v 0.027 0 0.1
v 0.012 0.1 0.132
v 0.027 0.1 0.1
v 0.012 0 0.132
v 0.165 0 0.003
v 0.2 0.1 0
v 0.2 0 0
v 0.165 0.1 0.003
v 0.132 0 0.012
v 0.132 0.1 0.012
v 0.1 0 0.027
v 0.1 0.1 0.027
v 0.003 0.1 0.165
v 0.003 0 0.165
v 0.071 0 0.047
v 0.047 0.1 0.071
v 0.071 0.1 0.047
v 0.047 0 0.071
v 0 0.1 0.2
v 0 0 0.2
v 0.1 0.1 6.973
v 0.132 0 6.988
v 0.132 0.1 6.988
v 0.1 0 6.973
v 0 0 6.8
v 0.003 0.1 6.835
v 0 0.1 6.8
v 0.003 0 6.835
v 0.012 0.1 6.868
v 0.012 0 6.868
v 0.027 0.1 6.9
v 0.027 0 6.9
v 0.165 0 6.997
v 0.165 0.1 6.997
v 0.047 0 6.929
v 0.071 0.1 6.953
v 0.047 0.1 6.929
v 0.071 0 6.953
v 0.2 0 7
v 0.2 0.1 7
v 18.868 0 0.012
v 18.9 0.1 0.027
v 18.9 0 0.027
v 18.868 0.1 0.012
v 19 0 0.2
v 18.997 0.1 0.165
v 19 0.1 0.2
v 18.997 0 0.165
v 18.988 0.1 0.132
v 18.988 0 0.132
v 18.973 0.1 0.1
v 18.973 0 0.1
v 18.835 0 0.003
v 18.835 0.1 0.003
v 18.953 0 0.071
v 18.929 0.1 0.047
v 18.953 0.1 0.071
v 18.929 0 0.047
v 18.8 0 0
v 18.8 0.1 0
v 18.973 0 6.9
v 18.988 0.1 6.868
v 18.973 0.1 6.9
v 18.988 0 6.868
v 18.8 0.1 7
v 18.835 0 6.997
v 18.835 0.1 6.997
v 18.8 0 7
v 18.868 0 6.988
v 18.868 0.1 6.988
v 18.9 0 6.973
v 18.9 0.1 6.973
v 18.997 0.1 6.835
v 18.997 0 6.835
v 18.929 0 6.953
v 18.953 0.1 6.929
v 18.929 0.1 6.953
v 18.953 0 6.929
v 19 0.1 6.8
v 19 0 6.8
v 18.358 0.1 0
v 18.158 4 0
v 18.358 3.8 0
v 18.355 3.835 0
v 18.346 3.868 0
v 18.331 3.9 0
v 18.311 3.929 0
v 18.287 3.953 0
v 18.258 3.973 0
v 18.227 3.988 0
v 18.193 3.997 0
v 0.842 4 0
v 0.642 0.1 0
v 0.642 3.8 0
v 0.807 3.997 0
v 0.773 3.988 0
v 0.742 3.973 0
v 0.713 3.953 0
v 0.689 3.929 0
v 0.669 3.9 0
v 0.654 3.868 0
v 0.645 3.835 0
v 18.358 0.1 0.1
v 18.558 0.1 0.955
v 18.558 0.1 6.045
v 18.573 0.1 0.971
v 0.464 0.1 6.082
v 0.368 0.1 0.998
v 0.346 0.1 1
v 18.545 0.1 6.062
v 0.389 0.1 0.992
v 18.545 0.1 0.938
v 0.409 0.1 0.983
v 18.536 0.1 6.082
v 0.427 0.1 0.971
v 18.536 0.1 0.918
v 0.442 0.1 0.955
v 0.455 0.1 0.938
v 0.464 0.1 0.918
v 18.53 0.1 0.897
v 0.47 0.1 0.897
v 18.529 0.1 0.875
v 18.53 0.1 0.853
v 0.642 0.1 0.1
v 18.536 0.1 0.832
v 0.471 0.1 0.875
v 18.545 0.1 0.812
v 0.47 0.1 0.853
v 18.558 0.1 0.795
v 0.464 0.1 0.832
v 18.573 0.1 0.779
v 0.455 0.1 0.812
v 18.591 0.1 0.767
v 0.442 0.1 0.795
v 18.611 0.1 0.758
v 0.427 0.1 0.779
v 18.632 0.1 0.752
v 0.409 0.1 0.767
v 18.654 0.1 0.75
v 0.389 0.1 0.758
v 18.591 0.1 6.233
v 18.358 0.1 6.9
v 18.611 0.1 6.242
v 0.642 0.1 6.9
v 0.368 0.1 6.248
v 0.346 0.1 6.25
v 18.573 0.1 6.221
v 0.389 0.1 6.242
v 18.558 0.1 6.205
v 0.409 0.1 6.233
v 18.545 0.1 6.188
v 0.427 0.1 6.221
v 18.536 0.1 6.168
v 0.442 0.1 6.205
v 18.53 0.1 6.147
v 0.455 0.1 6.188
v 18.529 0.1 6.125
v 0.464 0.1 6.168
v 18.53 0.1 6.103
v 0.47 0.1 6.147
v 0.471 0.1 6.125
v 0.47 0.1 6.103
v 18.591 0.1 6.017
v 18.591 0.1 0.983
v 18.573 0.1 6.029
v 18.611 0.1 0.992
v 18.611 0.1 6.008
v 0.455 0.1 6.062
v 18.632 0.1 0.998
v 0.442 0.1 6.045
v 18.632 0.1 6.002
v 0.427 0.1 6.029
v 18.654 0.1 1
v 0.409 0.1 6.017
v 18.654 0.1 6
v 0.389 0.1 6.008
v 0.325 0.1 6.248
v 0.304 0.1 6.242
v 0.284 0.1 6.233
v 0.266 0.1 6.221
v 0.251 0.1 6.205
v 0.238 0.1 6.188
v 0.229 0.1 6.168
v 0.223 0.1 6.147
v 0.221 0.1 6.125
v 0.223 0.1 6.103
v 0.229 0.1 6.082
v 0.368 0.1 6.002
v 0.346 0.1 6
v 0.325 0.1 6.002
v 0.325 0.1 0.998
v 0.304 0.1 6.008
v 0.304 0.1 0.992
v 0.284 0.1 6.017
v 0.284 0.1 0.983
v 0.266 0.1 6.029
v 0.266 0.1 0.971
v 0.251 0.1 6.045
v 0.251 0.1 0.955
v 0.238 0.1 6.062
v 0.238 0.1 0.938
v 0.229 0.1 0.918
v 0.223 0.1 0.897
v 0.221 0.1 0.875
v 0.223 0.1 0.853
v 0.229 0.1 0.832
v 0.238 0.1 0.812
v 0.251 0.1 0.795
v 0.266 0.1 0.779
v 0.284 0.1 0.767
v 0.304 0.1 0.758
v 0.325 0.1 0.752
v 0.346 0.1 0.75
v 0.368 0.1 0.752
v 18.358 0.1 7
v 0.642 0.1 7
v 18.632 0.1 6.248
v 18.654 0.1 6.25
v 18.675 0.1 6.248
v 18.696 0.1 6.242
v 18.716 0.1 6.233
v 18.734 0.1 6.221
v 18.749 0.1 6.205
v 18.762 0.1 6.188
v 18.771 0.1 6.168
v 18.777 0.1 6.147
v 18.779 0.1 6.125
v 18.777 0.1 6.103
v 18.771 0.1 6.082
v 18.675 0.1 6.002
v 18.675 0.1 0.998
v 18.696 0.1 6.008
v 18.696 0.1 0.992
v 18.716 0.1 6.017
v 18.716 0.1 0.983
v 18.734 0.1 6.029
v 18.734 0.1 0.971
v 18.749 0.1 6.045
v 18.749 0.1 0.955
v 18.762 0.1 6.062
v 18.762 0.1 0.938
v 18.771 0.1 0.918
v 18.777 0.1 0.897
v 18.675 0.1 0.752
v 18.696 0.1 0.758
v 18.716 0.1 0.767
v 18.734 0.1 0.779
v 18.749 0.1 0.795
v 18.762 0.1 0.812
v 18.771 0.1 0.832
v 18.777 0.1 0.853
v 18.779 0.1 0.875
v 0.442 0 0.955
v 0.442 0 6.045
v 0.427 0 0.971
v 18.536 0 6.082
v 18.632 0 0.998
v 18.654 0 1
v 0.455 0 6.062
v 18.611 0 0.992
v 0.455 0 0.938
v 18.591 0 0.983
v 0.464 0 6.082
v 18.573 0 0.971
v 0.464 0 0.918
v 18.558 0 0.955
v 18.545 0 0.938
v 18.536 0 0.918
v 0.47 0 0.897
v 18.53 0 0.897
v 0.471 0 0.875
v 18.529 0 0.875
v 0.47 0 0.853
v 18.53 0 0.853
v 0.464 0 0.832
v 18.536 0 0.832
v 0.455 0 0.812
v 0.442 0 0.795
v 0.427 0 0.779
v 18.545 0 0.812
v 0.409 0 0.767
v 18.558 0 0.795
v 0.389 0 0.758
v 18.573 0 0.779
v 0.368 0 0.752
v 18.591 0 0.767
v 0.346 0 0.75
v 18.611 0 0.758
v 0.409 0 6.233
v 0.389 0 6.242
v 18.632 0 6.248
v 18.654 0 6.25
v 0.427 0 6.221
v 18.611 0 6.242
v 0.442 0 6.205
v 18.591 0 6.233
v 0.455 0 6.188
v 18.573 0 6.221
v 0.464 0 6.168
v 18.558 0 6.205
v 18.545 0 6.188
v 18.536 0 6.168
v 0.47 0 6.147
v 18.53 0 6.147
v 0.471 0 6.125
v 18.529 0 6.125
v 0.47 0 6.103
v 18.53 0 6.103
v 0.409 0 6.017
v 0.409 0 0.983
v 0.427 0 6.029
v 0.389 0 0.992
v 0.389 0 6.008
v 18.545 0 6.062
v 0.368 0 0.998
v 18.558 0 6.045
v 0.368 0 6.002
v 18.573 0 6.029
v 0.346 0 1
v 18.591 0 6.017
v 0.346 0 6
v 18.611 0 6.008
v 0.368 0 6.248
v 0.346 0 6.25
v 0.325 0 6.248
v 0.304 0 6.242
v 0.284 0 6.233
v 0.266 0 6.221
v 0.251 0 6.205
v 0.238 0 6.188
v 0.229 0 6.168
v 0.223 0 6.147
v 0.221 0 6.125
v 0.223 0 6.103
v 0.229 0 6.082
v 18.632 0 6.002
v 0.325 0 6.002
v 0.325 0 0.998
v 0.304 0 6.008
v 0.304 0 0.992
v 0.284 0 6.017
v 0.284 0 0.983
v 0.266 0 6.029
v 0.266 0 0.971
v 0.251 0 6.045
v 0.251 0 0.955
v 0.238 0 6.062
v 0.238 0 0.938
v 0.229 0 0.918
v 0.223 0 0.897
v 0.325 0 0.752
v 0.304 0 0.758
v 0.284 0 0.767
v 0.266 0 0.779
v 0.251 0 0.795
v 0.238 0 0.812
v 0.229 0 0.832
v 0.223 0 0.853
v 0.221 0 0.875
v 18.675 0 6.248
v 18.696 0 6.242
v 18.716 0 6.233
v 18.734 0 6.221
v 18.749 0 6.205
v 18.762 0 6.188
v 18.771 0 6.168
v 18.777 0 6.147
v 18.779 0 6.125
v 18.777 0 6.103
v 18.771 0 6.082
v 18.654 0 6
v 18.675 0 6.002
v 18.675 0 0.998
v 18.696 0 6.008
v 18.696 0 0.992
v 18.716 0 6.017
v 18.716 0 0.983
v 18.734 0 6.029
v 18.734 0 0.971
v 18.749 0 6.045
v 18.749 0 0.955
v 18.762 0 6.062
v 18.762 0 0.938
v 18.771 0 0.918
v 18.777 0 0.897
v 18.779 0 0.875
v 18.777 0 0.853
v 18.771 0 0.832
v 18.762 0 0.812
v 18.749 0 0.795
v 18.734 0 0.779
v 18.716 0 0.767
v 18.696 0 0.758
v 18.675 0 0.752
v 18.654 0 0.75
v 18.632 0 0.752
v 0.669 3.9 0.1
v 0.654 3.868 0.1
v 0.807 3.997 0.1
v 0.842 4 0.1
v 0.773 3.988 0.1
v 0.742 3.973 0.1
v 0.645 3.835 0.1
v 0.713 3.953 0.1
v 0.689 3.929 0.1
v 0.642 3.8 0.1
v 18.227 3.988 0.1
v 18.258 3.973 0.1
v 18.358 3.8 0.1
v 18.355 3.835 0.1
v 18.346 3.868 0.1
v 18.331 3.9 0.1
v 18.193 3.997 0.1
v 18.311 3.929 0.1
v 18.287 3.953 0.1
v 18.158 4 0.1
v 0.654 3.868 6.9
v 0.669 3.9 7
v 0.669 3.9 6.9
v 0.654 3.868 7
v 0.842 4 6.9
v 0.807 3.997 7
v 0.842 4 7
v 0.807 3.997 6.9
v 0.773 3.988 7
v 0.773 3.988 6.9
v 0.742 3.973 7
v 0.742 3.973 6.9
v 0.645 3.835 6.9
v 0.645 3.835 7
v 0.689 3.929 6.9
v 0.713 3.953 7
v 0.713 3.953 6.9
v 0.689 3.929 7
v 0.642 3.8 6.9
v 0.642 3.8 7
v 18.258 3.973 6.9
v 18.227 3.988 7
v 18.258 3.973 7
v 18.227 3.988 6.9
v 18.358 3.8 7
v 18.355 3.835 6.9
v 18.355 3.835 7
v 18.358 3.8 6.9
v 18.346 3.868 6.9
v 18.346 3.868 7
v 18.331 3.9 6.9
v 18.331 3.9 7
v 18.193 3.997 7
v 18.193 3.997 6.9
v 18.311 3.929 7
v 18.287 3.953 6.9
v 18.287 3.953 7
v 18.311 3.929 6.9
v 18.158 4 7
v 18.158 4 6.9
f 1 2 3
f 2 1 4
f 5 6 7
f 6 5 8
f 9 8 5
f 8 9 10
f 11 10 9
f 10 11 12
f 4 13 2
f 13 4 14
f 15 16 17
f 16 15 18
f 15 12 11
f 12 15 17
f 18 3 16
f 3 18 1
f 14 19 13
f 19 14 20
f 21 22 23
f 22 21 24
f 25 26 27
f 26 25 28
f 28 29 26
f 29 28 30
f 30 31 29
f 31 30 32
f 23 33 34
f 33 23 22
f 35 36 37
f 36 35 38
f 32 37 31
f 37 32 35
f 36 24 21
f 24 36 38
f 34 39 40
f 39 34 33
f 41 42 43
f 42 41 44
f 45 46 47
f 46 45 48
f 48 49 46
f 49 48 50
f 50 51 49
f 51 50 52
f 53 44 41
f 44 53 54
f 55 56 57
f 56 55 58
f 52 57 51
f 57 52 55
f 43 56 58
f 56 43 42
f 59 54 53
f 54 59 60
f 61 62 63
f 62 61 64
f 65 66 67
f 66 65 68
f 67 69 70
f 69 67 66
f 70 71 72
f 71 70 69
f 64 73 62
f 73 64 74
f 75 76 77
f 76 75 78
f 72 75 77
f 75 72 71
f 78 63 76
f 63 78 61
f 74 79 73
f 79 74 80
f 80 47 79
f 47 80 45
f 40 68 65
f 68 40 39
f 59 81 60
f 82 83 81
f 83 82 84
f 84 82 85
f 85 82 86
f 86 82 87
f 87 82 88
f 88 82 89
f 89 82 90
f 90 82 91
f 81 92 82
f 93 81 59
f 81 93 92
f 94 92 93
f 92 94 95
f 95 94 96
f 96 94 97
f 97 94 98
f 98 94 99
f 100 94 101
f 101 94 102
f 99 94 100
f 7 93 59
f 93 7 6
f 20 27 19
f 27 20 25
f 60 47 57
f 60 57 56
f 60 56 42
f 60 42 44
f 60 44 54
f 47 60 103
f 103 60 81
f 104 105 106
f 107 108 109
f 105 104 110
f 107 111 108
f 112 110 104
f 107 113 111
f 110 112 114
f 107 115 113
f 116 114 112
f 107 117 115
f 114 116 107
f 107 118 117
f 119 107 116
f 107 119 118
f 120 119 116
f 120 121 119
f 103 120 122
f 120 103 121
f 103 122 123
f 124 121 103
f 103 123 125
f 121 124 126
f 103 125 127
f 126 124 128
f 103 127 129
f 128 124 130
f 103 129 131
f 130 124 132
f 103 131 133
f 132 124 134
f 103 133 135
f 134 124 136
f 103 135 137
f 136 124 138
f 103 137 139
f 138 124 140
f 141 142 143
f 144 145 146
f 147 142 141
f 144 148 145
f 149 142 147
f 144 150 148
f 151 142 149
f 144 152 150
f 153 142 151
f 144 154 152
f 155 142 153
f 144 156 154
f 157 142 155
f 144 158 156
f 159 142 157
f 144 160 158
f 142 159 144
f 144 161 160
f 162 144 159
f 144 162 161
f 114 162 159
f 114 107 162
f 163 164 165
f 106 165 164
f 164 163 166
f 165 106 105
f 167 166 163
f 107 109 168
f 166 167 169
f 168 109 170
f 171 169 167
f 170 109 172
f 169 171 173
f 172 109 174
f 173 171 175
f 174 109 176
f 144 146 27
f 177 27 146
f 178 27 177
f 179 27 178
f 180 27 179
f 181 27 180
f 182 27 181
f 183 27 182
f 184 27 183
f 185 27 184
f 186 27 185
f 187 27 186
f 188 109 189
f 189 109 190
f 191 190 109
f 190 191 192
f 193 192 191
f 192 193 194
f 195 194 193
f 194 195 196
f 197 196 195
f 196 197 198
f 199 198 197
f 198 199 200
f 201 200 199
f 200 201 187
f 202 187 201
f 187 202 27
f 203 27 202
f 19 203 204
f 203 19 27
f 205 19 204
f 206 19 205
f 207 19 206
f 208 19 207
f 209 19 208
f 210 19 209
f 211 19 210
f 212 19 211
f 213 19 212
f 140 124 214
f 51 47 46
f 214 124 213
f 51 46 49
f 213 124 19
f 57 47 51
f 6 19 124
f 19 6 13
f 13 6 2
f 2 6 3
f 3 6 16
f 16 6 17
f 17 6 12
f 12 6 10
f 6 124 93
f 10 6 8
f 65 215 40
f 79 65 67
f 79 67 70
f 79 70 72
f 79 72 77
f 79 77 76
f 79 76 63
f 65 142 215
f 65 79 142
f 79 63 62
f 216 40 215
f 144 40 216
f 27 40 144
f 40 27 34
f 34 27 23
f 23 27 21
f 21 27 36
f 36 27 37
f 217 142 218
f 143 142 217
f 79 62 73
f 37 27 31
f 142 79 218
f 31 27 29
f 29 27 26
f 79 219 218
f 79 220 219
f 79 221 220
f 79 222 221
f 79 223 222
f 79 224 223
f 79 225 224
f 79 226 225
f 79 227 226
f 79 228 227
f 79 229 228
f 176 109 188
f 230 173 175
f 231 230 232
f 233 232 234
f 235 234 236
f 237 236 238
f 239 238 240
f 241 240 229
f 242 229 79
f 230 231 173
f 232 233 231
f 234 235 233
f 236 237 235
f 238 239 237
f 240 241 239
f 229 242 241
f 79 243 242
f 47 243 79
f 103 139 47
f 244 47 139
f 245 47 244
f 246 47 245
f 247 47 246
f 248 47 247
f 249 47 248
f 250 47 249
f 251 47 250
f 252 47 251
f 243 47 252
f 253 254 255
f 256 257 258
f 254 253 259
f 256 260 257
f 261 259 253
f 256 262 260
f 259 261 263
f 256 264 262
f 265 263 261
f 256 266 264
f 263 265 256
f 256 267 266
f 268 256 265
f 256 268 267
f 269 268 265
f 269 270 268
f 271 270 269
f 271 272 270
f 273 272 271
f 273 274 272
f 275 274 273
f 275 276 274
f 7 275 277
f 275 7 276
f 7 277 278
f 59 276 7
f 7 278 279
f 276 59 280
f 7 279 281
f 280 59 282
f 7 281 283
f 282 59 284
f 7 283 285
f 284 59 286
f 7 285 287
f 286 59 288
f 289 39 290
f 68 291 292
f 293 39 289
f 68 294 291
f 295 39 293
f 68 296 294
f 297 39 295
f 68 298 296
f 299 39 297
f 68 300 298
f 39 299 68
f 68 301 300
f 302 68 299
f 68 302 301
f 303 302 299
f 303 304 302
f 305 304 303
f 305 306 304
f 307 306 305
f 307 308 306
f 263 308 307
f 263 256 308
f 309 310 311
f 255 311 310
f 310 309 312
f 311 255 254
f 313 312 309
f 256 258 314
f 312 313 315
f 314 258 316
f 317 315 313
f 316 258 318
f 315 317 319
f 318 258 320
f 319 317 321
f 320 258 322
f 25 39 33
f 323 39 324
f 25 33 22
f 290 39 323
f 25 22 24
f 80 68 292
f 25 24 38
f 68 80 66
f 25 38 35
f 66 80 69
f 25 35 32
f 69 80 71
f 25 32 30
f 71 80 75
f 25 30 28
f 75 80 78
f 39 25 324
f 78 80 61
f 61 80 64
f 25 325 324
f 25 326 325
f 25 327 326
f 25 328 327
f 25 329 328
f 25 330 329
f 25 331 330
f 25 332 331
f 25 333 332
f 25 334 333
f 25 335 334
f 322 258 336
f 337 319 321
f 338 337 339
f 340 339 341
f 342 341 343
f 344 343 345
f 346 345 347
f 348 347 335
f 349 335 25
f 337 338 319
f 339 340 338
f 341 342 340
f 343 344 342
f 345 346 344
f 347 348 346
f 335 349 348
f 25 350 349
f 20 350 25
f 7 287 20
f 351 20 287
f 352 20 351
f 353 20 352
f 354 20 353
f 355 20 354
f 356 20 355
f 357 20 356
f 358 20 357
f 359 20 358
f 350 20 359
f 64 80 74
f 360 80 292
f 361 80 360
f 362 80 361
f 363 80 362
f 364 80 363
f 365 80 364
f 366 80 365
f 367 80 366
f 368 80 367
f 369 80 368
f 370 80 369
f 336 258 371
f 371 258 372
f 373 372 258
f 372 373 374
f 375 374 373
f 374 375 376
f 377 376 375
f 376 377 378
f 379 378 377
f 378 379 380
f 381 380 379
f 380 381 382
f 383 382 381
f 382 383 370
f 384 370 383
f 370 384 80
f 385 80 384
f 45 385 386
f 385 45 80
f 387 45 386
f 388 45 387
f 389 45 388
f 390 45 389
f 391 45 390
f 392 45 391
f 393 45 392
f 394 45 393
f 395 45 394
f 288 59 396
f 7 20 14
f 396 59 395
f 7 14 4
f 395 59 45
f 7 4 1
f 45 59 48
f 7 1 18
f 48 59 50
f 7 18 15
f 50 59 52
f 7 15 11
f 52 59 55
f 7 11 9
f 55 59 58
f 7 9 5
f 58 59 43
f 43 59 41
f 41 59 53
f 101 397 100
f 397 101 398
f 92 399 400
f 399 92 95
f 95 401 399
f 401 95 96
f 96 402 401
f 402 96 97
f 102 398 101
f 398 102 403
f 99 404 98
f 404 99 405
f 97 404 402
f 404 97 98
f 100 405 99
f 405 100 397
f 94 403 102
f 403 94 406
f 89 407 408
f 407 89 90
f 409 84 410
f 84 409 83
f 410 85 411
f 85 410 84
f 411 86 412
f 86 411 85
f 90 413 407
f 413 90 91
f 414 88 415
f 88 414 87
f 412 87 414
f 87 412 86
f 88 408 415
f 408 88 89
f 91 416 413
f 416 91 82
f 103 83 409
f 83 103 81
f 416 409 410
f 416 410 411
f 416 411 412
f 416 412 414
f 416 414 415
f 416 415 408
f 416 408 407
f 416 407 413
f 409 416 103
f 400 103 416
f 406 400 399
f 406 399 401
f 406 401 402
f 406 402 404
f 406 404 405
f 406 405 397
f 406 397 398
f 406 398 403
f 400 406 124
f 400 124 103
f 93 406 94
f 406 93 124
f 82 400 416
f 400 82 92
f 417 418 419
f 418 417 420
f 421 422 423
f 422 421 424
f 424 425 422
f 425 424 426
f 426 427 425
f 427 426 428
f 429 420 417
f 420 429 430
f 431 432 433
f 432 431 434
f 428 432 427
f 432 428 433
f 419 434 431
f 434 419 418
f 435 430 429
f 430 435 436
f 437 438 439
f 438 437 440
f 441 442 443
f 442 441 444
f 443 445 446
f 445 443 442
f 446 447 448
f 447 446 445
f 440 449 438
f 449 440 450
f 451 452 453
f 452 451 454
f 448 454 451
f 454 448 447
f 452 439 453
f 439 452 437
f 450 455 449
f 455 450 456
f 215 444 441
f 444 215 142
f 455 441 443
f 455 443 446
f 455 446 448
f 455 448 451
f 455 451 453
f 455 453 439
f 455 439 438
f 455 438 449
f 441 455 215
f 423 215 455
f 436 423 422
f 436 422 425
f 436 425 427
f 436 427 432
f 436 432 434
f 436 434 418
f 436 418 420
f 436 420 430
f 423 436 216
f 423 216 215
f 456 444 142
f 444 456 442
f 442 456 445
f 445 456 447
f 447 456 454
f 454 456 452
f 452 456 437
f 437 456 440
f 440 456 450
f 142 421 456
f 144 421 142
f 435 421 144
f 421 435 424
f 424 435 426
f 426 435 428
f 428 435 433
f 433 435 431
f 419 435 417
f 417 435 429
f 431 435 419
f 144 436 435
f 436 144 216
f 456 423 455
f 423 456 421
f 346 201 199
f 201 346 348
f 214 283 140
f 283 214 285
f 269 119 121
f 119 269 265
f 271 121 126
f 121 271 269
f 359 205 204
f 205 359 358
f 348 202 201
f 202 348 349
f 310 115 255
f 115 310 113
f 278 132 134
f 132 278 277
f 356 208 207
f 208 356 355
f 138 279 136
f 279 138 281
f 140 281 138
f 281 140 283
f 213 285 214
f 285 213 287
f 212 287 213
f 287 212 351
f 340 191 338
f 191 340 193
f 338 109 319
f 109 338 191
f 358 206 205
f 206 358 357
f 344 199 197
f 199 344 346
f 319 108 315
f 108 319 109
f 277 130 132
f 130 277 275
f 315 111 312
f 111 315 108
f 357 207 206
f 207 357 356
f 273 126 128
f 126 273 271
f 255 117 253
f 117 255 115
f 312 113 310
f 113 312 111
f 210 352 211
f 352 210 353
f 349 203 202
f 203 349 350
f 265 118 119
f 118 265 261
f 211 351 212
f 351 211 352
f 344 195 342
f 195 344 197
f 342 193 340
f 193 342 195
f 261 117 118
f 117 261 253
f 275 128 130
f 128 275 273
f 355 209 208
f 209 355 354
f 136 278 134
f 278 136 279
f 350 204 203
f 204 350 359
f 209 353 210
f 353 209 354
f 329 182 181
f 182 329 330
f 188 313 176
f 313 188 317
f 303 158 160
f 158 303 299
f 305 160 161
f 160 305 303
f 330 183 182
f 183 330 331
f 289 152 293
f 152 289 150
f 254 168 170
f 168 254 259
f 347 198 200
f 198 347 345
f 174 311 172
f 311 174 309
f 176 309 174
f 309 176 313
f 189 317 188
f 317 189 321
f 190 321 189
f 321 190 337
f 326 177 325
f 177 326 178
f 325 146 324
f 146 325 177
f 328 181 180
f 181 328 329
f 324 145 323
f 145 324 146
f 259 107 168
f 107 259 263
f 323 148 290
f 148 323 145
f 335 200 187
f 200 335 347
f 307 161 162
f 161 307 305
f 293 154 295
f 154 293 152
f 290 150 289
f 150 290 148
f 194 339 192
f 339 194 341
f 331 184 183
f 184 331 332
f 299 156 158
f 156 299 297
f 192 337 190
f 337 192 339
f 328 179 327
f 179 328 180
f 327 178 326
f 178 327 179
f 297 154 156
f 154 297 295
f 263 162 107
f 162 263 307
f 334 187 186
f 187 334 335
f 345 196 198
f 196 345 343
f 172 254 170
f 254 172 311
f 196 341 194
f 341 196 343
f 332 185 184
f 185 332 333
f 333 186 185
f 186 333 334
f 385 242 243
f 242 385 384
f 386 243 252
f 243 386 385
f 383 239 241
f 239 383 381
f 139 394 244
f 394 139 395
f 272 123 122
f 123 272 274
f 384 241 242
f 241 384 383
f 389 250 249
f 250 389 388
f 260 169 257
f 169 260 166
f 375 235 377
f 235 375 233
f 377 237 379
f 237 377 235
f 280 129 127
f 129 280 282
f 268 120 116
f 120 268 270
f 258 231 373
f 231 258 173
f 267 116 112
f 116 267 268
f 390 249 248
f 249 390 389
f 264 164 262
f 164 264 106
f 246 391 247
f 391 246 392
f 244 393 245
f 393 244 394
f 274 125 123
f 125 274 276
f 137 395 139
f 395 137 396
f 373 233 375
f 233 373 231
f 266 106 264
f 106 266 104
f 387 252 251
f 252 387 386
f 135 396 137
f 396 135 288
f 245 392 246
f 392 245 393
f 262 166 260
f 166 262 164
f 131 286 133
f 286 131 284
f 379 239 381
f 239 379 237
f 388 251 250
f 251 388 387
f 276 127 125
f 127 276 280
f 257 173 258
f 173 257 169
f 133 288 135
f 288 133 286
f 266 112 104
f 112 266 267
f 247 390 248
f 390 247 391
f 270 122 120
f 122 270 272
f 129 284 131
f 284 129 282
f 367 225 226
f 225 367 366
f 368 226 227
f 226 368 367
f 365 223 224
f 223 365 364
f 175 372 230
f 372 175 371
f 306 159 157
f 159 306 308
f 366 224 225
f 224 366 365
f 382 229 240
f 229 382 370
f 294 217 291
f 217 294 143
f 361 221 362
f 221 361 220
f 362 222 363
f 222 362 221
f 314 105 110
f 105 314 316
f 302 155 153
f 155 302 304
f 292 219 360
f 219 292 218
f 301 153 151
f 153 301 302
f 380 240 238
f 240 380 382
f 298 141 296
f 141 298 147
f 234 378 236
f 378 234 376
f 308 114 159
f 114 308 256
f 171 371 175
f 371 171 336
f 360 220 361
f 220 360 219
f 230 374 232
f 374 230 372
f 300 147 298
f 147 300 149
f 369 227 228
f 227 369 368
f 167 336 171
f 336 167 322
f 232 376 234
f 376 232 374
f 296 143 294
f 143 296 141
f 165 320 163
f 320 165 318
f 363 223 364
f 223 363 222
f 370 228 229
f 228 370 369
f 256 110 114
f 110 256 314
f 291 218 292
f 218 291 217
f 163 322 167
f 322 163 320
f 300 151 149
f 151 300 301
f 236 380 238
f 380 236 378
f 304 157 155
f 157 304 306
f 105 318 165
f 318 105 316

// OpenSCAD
//general conventions:
//Dimensions:
// heights are in Rack units (1.75 in)
// other dimensions are in inches
//Directions:
// x - width f rack
// y - depth (front to back)
// z - vertical height

//dimensions of panel
desired_height = 4; //in rack-units
desired_depth = 4; //front-to-back, in inches
desired_thickness = 0.1; //thickness of metal, in inches
holediam=0.25; //diameter of screw hole; TODO: verify this; might need to be slightly oversized due to undersizing problem (https://en.wikibooks.org/wiki/OpenSCAD_User_Manual/undersized_circular_objects)
cornerradius=0.2; //radius of rounded corners, in inches


//useful constants
fullwidth=19; //in front of vertical posts
insidewidth=17.7165; //inside vertical posts
holewidth=18.3071; //center-to-center hole spacing

//other parameters
$fn = 36; // number of steps per circle, for approximating circle/cylinder/sphere using polygons

module cornerround(radius, height=10*desired_thickness)
{
	difference() {
	translate([-1,-radius/2,-1])
		cube(radius+1);
	translate([radius,height/2,radius])
		rotate([90,0,0])
			cylinder(h=height, r=radius);
	}
}

module frontpanel(height, depth, thickness)
{
	//front panel
	difference() {
		cube([fullwidth, thickness, height*1.75]);
			union() {
				//front face, lower left
				cornerround(cornerradius);

				//front face, upper left
				translate([0,0,desired_height*1.75])
					rotate([0,90,0])
						cornerround(cornerradius);

				//front face, lower right
				translate([fullwidth, 0, 0])
					rotate([0,270,0])
						cornerround(cornerradius);
		
				//front face, upper right
				translate([fullwidth,0,desired_height*1.75])
					rotate([0,180,0])
						cornerround(cornerradius);
			}
	}

}

module depthpanel(height, depth, thickness)
{

	difference() {
		translate([(fullwidth-insidewidth)/2, 0, 0])
			cube([insidewidth, depth, thickness]);

		union() {
			//left-back corner
			translate([(fullwidth-insidewidth)/2, desired_depth, -cornerradius/2])
				rotate([90,0,0])
					cornerround(cornerradius);

			//right-back corner
			translate([(fullwidth-insidewidth)/2+insidewidth, desired_depth, -cornerradius/2])
				rotate([90,0,270])
					cornerround(cornerradius);
		}

	}

}

module blankingpanel(height, depth, thickness)
{

	//height in rack-units (1.75 in)
	//depth (front-to-back) in inches
	//thickness (metal thickness) in inches)

	difference() {
		union() 
		{
			frontpanel(height, depth, thickness);
			//lower depth panel
			depthpanel(height, depth, thickness);
		
			//upper depth panel
			translate([0, 0, 1.75*height-thickness])
				depthpanel(height, depth, thickness);
	
		}



		//mounting holes
		
		union() {
			//bottom-left hole
			translate([(fullwidth-holewidth)/2, 5*thickness, 0.875])
				rotate([90, 0, 0])
					cylinder(h=10*thickness, r=holediam/2);

			//top-left hole
			translate([(fullwidth-holewidth)/2, 5*thickness, (height*1.75)-0.875])
				rotate([90, 0, 0])
					cylinder(h=10*thickness, r=holediam/2);		
		
	
			//bottom-right hole
			translate([(fullwidth-holewidth)/2 + holewidth, 5*thickness, 0.875])
				rotate([90, 0, 0])
					cylinder(h=10*thickness, r=holediam/2);

			//top-right hole
			translate([(fullwidth-holewidth)/2 + holewidth, 5*thickness, (height*1.75)-0.875])
				rotate([90, 0, 0])
					cylinder(h=10*thickness, r=holediam/2);
		}

	}

}


union() {
	blankingpanel(desired_height, desired_depth, desired_thickness);

					

	
}
